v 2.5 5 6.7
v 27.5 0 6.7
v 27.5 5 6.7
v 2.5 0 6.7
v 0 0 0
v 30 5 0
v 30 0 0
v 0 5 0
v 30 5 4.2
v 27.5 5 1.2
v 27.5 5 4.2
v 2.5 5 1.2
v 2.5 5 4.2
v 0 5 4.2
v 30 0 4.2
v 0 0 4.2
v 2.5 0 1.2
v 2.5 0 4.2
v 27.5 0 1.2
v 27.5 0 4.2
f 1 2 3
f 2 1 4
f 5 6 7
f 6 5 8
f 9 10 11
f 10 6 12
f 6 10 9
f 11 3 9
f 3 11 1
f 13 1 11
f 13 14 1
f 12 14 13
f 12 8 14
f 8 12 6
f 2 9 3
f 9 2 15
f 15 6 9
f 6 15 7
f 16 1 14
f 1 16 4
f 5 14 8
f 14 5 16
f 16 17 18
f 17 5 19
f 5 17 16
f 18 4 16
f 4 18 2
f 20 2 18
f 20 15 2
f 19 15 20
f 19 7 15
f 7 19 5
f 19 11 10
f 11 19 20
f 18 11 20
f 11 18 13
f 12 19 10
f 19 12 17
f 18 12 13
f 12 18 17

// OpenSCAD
$fn=64;

// rotate([0,90,0]) scale([1,1.3,1]) difference() {
//   cylinder(r=34.25,h=54);
//   translate([0,0,-0.1]) cylinder(r=33,h=54.2);
// }
// band();
// claw();

// claw();

// cube([20,80,1.2]);

// slots();


strapLoop();

module strapLoop() {
  difference() {
    hull() {
      cube([30,5,4.2]);
      translate([2.5,0,4.2]) cube([25,5,2.5]);
    }
    translate([2.5,-0.1,1.2]) cube([25,5.2,3]);
  }
}

module slots() {
  difference() {
    union() {
      translate([0,-5,100]) clawSlot();
      translate([26,-2,100]) rotate([0,0,8]) clawSlot();
      translate([-26,-2,100]) rotate([0,0,-8]) clawSlot();
    }
    scale([1,0.2,1]) cylinder(r=40,h=101);
  }
}
module clawSlot() {
  mirror([0,0,1]) mirror([0,1,0]) difference() {
  scale([0.35,1,1.5]) sphere(r=34);
  translate([-34,-34,-68]) cube([68,68,68]);
  translate([-34,-68,-1]) cube([68,68,68]);
  translate([-1.5,-0.1,-0.1]) cube([3,31,10]);
  translate([-2.5,-0.1,2]) cube([5,31,10]); 
 }
}


module claw() {
difference() {
scale([1,0.2,1]) difference() {
  union() {
    cylinder(r=40,h=100);
    translate([0,0,100]) cylinder(r1=40, r2=30,h=4);
  }
  translate([0,0,-0.1]) cylinder(r=24,h=104.2);
  translate([-100,0,-1]) cube([200, 200, 200]);
}
  translate([48,1,0]) scale([1,1,1.5]) rotate([90,0,0]) cylinder(r1=20, r2=40,h=30);
  translate([-48,1,0]) scale([1,1,1.5]) rotate([90,0,0]) cylinder(r1=20, r2=40,h=30);

}
}


module band() {
  translate([124,75.7,-40.9]) scale(1.25) import("./Cosplay_Garras_Vega_01.stl");
}

// module claw() {
//   // difference() {
//   translate([124,-41.8,-40.9]) scale(1.25) import("./Cosplay_Garras_Vega_00.stl");
//   // translate([152.8,0,-1000+36]) rotate([0,90,0]) difference() {
//   //   cylinder(r=1100, h=1000);
//   //   translate([0,0,-0.1]) cylinder(r=998.65,h=50);
//   // }
//   // }
//   // translate([152.8,-50,35]) cube([1000,100,20]);
// }
